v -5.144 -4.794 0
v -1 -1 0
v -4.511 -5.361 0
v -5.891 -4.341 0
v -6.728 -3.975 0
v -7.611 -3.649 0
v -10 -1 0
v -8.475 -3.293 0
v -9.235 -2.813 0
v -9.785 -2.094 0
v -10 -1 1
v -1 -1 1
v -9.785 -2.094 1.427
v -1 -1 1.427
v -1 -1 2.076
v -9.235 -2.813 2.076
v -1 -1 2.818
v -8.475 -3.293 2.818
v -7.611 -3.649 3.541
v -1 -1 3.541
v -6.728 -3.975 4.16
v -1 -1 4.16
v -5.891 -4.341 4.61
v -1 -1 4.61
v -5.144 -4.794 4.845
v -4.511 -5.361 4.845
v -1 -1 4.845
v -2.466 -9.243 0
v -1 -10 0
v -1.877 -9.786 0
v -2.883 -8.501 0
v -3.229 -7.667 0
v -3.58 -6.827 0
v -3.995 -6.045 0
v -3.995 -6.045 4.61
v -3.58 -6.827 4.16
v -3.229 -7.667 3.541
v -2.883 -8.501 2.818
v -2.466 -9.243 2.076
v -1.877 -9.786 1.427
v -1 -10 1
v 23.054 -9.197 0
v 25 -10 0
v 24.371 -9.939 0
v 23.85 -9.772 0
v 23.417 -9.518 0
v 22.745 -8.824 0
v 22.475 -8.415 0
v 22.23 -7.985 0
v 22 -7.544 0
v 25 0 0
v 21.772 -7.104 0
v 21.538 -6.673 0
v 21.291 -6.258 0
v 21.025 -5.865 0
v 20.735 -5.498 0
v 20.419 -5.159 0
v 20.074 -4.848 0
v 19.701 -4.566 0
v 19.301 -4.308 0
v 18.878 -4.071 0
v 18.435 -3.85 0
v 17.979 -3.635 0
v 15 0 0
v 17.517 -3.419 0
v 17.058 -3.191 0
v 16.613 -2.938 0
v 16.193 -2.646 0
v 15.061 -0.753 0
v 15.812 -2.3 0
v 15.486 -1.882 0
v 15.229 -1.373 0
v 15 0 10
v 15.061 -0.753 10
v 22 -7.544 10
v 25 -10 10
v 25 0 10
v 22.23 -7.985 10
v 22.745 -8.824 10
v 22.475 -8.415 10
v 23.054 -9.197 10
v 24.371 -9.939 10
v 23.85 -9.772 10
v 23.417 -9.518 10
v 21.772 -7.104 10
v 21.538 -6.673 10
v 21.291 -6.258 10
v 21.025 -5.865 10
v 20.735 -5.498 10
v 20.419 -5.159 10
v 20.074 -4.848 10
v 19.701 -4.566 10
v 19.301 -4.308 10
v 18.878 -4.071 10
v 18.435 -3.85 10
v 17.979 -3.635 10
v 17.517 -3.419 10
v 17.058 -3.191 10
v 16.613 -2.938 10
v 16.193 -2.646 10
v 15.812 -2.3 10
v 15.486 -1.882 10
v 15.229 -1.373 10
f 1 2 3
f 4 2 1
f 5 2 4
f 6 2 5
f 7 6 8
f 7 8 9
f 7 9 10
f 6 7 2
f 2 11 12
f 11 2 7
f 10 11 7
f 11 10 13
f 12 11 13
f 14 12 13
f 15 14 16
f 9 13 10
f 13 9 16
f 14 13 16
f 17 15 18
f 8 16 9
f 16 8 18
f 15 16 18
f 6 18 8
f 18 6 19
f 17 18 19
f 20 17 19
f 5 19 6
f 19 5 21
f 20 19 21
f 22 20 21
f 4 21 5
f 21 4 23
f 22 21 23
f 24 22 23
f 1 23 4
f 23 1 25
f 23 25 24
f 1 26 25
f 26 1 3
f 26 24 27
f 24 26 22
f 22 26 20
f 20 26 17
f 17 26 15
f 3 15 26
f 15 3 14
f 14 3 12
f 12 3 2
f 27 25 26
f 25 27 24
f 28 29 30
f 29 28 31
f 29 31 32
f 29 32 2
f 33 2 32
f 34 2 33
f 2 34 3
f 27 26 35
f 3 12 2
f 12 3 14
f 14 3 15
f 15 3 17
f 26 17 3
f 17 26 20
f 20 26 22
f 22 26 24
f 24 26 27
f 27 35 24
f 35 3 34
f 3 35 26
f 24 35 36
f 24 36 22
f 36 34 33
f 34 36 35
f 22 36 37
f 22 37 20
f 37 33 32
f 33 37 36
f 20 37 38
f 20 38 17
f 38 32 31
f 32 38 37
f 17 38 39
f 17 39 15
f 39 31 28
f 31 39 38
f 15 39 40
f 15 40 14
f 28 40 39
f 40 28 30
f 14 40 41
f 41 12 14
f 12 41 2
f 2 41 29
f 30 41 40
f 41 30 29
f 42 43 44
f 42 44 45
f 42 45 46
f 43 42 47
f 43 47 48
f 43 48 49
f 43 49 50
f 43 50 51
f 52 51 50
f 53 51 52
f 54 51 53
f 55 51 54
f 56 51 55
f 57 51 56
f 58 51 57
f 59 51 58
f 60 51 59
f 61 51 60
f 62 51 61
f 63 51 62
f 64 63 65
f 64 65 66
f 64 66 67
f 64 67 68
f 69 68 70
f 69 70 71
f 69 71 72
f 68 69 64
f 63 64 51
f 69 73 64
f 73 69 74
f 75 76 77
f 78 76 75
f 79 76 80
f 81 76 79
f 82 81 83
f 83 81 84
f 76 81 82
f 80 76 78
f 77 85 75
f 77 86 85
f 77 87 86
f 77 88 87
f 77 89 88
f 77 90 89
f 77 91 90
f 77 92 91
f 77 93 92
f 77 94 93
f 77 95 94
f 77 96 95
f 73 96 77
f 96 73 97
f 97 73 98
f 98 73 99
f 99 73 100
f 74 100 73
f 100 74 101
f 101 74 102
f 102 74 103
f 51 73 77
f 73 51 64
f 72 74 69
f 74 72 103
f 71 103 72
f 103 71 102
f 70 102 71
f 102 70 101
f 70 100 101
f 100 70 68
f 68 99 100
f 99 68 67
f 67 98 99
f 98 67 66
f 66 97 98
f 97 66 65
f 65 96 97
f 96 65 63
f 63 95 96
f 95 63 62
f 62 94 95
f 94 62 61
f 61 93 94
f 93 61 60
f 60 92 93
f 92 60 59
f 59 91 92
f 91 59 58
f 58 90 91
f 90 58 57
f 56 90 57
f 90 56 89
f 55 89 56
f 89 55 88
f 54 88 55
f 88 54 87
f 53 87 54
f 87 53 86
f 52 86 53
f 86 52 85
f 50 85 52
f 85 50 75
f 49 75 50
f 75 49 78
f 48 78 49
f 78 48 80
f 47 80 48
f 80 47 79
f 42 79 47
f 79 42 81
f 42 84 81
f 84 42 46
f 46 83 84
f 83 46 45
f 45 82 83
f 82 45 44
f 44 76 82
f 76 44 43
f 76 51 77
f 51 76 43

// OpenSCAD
use <BezierScad.scad>;

BezArc([
  [-10,-1],
  [-10, -6],
  [-1, -1],
  [-5, -10],
  [-1,-10]
  ], [-1,-1], steps = 16, heightCtls = [1,2,10,2,1]);

translate([25,0,0]) 
    BezArc([
      [-10, 0],
      [-10, -6],
      [-1, -1],
      [-5, -10],
      [0,-10]
      ], focalPoint = [0,0], steps = 30, height = 10);
